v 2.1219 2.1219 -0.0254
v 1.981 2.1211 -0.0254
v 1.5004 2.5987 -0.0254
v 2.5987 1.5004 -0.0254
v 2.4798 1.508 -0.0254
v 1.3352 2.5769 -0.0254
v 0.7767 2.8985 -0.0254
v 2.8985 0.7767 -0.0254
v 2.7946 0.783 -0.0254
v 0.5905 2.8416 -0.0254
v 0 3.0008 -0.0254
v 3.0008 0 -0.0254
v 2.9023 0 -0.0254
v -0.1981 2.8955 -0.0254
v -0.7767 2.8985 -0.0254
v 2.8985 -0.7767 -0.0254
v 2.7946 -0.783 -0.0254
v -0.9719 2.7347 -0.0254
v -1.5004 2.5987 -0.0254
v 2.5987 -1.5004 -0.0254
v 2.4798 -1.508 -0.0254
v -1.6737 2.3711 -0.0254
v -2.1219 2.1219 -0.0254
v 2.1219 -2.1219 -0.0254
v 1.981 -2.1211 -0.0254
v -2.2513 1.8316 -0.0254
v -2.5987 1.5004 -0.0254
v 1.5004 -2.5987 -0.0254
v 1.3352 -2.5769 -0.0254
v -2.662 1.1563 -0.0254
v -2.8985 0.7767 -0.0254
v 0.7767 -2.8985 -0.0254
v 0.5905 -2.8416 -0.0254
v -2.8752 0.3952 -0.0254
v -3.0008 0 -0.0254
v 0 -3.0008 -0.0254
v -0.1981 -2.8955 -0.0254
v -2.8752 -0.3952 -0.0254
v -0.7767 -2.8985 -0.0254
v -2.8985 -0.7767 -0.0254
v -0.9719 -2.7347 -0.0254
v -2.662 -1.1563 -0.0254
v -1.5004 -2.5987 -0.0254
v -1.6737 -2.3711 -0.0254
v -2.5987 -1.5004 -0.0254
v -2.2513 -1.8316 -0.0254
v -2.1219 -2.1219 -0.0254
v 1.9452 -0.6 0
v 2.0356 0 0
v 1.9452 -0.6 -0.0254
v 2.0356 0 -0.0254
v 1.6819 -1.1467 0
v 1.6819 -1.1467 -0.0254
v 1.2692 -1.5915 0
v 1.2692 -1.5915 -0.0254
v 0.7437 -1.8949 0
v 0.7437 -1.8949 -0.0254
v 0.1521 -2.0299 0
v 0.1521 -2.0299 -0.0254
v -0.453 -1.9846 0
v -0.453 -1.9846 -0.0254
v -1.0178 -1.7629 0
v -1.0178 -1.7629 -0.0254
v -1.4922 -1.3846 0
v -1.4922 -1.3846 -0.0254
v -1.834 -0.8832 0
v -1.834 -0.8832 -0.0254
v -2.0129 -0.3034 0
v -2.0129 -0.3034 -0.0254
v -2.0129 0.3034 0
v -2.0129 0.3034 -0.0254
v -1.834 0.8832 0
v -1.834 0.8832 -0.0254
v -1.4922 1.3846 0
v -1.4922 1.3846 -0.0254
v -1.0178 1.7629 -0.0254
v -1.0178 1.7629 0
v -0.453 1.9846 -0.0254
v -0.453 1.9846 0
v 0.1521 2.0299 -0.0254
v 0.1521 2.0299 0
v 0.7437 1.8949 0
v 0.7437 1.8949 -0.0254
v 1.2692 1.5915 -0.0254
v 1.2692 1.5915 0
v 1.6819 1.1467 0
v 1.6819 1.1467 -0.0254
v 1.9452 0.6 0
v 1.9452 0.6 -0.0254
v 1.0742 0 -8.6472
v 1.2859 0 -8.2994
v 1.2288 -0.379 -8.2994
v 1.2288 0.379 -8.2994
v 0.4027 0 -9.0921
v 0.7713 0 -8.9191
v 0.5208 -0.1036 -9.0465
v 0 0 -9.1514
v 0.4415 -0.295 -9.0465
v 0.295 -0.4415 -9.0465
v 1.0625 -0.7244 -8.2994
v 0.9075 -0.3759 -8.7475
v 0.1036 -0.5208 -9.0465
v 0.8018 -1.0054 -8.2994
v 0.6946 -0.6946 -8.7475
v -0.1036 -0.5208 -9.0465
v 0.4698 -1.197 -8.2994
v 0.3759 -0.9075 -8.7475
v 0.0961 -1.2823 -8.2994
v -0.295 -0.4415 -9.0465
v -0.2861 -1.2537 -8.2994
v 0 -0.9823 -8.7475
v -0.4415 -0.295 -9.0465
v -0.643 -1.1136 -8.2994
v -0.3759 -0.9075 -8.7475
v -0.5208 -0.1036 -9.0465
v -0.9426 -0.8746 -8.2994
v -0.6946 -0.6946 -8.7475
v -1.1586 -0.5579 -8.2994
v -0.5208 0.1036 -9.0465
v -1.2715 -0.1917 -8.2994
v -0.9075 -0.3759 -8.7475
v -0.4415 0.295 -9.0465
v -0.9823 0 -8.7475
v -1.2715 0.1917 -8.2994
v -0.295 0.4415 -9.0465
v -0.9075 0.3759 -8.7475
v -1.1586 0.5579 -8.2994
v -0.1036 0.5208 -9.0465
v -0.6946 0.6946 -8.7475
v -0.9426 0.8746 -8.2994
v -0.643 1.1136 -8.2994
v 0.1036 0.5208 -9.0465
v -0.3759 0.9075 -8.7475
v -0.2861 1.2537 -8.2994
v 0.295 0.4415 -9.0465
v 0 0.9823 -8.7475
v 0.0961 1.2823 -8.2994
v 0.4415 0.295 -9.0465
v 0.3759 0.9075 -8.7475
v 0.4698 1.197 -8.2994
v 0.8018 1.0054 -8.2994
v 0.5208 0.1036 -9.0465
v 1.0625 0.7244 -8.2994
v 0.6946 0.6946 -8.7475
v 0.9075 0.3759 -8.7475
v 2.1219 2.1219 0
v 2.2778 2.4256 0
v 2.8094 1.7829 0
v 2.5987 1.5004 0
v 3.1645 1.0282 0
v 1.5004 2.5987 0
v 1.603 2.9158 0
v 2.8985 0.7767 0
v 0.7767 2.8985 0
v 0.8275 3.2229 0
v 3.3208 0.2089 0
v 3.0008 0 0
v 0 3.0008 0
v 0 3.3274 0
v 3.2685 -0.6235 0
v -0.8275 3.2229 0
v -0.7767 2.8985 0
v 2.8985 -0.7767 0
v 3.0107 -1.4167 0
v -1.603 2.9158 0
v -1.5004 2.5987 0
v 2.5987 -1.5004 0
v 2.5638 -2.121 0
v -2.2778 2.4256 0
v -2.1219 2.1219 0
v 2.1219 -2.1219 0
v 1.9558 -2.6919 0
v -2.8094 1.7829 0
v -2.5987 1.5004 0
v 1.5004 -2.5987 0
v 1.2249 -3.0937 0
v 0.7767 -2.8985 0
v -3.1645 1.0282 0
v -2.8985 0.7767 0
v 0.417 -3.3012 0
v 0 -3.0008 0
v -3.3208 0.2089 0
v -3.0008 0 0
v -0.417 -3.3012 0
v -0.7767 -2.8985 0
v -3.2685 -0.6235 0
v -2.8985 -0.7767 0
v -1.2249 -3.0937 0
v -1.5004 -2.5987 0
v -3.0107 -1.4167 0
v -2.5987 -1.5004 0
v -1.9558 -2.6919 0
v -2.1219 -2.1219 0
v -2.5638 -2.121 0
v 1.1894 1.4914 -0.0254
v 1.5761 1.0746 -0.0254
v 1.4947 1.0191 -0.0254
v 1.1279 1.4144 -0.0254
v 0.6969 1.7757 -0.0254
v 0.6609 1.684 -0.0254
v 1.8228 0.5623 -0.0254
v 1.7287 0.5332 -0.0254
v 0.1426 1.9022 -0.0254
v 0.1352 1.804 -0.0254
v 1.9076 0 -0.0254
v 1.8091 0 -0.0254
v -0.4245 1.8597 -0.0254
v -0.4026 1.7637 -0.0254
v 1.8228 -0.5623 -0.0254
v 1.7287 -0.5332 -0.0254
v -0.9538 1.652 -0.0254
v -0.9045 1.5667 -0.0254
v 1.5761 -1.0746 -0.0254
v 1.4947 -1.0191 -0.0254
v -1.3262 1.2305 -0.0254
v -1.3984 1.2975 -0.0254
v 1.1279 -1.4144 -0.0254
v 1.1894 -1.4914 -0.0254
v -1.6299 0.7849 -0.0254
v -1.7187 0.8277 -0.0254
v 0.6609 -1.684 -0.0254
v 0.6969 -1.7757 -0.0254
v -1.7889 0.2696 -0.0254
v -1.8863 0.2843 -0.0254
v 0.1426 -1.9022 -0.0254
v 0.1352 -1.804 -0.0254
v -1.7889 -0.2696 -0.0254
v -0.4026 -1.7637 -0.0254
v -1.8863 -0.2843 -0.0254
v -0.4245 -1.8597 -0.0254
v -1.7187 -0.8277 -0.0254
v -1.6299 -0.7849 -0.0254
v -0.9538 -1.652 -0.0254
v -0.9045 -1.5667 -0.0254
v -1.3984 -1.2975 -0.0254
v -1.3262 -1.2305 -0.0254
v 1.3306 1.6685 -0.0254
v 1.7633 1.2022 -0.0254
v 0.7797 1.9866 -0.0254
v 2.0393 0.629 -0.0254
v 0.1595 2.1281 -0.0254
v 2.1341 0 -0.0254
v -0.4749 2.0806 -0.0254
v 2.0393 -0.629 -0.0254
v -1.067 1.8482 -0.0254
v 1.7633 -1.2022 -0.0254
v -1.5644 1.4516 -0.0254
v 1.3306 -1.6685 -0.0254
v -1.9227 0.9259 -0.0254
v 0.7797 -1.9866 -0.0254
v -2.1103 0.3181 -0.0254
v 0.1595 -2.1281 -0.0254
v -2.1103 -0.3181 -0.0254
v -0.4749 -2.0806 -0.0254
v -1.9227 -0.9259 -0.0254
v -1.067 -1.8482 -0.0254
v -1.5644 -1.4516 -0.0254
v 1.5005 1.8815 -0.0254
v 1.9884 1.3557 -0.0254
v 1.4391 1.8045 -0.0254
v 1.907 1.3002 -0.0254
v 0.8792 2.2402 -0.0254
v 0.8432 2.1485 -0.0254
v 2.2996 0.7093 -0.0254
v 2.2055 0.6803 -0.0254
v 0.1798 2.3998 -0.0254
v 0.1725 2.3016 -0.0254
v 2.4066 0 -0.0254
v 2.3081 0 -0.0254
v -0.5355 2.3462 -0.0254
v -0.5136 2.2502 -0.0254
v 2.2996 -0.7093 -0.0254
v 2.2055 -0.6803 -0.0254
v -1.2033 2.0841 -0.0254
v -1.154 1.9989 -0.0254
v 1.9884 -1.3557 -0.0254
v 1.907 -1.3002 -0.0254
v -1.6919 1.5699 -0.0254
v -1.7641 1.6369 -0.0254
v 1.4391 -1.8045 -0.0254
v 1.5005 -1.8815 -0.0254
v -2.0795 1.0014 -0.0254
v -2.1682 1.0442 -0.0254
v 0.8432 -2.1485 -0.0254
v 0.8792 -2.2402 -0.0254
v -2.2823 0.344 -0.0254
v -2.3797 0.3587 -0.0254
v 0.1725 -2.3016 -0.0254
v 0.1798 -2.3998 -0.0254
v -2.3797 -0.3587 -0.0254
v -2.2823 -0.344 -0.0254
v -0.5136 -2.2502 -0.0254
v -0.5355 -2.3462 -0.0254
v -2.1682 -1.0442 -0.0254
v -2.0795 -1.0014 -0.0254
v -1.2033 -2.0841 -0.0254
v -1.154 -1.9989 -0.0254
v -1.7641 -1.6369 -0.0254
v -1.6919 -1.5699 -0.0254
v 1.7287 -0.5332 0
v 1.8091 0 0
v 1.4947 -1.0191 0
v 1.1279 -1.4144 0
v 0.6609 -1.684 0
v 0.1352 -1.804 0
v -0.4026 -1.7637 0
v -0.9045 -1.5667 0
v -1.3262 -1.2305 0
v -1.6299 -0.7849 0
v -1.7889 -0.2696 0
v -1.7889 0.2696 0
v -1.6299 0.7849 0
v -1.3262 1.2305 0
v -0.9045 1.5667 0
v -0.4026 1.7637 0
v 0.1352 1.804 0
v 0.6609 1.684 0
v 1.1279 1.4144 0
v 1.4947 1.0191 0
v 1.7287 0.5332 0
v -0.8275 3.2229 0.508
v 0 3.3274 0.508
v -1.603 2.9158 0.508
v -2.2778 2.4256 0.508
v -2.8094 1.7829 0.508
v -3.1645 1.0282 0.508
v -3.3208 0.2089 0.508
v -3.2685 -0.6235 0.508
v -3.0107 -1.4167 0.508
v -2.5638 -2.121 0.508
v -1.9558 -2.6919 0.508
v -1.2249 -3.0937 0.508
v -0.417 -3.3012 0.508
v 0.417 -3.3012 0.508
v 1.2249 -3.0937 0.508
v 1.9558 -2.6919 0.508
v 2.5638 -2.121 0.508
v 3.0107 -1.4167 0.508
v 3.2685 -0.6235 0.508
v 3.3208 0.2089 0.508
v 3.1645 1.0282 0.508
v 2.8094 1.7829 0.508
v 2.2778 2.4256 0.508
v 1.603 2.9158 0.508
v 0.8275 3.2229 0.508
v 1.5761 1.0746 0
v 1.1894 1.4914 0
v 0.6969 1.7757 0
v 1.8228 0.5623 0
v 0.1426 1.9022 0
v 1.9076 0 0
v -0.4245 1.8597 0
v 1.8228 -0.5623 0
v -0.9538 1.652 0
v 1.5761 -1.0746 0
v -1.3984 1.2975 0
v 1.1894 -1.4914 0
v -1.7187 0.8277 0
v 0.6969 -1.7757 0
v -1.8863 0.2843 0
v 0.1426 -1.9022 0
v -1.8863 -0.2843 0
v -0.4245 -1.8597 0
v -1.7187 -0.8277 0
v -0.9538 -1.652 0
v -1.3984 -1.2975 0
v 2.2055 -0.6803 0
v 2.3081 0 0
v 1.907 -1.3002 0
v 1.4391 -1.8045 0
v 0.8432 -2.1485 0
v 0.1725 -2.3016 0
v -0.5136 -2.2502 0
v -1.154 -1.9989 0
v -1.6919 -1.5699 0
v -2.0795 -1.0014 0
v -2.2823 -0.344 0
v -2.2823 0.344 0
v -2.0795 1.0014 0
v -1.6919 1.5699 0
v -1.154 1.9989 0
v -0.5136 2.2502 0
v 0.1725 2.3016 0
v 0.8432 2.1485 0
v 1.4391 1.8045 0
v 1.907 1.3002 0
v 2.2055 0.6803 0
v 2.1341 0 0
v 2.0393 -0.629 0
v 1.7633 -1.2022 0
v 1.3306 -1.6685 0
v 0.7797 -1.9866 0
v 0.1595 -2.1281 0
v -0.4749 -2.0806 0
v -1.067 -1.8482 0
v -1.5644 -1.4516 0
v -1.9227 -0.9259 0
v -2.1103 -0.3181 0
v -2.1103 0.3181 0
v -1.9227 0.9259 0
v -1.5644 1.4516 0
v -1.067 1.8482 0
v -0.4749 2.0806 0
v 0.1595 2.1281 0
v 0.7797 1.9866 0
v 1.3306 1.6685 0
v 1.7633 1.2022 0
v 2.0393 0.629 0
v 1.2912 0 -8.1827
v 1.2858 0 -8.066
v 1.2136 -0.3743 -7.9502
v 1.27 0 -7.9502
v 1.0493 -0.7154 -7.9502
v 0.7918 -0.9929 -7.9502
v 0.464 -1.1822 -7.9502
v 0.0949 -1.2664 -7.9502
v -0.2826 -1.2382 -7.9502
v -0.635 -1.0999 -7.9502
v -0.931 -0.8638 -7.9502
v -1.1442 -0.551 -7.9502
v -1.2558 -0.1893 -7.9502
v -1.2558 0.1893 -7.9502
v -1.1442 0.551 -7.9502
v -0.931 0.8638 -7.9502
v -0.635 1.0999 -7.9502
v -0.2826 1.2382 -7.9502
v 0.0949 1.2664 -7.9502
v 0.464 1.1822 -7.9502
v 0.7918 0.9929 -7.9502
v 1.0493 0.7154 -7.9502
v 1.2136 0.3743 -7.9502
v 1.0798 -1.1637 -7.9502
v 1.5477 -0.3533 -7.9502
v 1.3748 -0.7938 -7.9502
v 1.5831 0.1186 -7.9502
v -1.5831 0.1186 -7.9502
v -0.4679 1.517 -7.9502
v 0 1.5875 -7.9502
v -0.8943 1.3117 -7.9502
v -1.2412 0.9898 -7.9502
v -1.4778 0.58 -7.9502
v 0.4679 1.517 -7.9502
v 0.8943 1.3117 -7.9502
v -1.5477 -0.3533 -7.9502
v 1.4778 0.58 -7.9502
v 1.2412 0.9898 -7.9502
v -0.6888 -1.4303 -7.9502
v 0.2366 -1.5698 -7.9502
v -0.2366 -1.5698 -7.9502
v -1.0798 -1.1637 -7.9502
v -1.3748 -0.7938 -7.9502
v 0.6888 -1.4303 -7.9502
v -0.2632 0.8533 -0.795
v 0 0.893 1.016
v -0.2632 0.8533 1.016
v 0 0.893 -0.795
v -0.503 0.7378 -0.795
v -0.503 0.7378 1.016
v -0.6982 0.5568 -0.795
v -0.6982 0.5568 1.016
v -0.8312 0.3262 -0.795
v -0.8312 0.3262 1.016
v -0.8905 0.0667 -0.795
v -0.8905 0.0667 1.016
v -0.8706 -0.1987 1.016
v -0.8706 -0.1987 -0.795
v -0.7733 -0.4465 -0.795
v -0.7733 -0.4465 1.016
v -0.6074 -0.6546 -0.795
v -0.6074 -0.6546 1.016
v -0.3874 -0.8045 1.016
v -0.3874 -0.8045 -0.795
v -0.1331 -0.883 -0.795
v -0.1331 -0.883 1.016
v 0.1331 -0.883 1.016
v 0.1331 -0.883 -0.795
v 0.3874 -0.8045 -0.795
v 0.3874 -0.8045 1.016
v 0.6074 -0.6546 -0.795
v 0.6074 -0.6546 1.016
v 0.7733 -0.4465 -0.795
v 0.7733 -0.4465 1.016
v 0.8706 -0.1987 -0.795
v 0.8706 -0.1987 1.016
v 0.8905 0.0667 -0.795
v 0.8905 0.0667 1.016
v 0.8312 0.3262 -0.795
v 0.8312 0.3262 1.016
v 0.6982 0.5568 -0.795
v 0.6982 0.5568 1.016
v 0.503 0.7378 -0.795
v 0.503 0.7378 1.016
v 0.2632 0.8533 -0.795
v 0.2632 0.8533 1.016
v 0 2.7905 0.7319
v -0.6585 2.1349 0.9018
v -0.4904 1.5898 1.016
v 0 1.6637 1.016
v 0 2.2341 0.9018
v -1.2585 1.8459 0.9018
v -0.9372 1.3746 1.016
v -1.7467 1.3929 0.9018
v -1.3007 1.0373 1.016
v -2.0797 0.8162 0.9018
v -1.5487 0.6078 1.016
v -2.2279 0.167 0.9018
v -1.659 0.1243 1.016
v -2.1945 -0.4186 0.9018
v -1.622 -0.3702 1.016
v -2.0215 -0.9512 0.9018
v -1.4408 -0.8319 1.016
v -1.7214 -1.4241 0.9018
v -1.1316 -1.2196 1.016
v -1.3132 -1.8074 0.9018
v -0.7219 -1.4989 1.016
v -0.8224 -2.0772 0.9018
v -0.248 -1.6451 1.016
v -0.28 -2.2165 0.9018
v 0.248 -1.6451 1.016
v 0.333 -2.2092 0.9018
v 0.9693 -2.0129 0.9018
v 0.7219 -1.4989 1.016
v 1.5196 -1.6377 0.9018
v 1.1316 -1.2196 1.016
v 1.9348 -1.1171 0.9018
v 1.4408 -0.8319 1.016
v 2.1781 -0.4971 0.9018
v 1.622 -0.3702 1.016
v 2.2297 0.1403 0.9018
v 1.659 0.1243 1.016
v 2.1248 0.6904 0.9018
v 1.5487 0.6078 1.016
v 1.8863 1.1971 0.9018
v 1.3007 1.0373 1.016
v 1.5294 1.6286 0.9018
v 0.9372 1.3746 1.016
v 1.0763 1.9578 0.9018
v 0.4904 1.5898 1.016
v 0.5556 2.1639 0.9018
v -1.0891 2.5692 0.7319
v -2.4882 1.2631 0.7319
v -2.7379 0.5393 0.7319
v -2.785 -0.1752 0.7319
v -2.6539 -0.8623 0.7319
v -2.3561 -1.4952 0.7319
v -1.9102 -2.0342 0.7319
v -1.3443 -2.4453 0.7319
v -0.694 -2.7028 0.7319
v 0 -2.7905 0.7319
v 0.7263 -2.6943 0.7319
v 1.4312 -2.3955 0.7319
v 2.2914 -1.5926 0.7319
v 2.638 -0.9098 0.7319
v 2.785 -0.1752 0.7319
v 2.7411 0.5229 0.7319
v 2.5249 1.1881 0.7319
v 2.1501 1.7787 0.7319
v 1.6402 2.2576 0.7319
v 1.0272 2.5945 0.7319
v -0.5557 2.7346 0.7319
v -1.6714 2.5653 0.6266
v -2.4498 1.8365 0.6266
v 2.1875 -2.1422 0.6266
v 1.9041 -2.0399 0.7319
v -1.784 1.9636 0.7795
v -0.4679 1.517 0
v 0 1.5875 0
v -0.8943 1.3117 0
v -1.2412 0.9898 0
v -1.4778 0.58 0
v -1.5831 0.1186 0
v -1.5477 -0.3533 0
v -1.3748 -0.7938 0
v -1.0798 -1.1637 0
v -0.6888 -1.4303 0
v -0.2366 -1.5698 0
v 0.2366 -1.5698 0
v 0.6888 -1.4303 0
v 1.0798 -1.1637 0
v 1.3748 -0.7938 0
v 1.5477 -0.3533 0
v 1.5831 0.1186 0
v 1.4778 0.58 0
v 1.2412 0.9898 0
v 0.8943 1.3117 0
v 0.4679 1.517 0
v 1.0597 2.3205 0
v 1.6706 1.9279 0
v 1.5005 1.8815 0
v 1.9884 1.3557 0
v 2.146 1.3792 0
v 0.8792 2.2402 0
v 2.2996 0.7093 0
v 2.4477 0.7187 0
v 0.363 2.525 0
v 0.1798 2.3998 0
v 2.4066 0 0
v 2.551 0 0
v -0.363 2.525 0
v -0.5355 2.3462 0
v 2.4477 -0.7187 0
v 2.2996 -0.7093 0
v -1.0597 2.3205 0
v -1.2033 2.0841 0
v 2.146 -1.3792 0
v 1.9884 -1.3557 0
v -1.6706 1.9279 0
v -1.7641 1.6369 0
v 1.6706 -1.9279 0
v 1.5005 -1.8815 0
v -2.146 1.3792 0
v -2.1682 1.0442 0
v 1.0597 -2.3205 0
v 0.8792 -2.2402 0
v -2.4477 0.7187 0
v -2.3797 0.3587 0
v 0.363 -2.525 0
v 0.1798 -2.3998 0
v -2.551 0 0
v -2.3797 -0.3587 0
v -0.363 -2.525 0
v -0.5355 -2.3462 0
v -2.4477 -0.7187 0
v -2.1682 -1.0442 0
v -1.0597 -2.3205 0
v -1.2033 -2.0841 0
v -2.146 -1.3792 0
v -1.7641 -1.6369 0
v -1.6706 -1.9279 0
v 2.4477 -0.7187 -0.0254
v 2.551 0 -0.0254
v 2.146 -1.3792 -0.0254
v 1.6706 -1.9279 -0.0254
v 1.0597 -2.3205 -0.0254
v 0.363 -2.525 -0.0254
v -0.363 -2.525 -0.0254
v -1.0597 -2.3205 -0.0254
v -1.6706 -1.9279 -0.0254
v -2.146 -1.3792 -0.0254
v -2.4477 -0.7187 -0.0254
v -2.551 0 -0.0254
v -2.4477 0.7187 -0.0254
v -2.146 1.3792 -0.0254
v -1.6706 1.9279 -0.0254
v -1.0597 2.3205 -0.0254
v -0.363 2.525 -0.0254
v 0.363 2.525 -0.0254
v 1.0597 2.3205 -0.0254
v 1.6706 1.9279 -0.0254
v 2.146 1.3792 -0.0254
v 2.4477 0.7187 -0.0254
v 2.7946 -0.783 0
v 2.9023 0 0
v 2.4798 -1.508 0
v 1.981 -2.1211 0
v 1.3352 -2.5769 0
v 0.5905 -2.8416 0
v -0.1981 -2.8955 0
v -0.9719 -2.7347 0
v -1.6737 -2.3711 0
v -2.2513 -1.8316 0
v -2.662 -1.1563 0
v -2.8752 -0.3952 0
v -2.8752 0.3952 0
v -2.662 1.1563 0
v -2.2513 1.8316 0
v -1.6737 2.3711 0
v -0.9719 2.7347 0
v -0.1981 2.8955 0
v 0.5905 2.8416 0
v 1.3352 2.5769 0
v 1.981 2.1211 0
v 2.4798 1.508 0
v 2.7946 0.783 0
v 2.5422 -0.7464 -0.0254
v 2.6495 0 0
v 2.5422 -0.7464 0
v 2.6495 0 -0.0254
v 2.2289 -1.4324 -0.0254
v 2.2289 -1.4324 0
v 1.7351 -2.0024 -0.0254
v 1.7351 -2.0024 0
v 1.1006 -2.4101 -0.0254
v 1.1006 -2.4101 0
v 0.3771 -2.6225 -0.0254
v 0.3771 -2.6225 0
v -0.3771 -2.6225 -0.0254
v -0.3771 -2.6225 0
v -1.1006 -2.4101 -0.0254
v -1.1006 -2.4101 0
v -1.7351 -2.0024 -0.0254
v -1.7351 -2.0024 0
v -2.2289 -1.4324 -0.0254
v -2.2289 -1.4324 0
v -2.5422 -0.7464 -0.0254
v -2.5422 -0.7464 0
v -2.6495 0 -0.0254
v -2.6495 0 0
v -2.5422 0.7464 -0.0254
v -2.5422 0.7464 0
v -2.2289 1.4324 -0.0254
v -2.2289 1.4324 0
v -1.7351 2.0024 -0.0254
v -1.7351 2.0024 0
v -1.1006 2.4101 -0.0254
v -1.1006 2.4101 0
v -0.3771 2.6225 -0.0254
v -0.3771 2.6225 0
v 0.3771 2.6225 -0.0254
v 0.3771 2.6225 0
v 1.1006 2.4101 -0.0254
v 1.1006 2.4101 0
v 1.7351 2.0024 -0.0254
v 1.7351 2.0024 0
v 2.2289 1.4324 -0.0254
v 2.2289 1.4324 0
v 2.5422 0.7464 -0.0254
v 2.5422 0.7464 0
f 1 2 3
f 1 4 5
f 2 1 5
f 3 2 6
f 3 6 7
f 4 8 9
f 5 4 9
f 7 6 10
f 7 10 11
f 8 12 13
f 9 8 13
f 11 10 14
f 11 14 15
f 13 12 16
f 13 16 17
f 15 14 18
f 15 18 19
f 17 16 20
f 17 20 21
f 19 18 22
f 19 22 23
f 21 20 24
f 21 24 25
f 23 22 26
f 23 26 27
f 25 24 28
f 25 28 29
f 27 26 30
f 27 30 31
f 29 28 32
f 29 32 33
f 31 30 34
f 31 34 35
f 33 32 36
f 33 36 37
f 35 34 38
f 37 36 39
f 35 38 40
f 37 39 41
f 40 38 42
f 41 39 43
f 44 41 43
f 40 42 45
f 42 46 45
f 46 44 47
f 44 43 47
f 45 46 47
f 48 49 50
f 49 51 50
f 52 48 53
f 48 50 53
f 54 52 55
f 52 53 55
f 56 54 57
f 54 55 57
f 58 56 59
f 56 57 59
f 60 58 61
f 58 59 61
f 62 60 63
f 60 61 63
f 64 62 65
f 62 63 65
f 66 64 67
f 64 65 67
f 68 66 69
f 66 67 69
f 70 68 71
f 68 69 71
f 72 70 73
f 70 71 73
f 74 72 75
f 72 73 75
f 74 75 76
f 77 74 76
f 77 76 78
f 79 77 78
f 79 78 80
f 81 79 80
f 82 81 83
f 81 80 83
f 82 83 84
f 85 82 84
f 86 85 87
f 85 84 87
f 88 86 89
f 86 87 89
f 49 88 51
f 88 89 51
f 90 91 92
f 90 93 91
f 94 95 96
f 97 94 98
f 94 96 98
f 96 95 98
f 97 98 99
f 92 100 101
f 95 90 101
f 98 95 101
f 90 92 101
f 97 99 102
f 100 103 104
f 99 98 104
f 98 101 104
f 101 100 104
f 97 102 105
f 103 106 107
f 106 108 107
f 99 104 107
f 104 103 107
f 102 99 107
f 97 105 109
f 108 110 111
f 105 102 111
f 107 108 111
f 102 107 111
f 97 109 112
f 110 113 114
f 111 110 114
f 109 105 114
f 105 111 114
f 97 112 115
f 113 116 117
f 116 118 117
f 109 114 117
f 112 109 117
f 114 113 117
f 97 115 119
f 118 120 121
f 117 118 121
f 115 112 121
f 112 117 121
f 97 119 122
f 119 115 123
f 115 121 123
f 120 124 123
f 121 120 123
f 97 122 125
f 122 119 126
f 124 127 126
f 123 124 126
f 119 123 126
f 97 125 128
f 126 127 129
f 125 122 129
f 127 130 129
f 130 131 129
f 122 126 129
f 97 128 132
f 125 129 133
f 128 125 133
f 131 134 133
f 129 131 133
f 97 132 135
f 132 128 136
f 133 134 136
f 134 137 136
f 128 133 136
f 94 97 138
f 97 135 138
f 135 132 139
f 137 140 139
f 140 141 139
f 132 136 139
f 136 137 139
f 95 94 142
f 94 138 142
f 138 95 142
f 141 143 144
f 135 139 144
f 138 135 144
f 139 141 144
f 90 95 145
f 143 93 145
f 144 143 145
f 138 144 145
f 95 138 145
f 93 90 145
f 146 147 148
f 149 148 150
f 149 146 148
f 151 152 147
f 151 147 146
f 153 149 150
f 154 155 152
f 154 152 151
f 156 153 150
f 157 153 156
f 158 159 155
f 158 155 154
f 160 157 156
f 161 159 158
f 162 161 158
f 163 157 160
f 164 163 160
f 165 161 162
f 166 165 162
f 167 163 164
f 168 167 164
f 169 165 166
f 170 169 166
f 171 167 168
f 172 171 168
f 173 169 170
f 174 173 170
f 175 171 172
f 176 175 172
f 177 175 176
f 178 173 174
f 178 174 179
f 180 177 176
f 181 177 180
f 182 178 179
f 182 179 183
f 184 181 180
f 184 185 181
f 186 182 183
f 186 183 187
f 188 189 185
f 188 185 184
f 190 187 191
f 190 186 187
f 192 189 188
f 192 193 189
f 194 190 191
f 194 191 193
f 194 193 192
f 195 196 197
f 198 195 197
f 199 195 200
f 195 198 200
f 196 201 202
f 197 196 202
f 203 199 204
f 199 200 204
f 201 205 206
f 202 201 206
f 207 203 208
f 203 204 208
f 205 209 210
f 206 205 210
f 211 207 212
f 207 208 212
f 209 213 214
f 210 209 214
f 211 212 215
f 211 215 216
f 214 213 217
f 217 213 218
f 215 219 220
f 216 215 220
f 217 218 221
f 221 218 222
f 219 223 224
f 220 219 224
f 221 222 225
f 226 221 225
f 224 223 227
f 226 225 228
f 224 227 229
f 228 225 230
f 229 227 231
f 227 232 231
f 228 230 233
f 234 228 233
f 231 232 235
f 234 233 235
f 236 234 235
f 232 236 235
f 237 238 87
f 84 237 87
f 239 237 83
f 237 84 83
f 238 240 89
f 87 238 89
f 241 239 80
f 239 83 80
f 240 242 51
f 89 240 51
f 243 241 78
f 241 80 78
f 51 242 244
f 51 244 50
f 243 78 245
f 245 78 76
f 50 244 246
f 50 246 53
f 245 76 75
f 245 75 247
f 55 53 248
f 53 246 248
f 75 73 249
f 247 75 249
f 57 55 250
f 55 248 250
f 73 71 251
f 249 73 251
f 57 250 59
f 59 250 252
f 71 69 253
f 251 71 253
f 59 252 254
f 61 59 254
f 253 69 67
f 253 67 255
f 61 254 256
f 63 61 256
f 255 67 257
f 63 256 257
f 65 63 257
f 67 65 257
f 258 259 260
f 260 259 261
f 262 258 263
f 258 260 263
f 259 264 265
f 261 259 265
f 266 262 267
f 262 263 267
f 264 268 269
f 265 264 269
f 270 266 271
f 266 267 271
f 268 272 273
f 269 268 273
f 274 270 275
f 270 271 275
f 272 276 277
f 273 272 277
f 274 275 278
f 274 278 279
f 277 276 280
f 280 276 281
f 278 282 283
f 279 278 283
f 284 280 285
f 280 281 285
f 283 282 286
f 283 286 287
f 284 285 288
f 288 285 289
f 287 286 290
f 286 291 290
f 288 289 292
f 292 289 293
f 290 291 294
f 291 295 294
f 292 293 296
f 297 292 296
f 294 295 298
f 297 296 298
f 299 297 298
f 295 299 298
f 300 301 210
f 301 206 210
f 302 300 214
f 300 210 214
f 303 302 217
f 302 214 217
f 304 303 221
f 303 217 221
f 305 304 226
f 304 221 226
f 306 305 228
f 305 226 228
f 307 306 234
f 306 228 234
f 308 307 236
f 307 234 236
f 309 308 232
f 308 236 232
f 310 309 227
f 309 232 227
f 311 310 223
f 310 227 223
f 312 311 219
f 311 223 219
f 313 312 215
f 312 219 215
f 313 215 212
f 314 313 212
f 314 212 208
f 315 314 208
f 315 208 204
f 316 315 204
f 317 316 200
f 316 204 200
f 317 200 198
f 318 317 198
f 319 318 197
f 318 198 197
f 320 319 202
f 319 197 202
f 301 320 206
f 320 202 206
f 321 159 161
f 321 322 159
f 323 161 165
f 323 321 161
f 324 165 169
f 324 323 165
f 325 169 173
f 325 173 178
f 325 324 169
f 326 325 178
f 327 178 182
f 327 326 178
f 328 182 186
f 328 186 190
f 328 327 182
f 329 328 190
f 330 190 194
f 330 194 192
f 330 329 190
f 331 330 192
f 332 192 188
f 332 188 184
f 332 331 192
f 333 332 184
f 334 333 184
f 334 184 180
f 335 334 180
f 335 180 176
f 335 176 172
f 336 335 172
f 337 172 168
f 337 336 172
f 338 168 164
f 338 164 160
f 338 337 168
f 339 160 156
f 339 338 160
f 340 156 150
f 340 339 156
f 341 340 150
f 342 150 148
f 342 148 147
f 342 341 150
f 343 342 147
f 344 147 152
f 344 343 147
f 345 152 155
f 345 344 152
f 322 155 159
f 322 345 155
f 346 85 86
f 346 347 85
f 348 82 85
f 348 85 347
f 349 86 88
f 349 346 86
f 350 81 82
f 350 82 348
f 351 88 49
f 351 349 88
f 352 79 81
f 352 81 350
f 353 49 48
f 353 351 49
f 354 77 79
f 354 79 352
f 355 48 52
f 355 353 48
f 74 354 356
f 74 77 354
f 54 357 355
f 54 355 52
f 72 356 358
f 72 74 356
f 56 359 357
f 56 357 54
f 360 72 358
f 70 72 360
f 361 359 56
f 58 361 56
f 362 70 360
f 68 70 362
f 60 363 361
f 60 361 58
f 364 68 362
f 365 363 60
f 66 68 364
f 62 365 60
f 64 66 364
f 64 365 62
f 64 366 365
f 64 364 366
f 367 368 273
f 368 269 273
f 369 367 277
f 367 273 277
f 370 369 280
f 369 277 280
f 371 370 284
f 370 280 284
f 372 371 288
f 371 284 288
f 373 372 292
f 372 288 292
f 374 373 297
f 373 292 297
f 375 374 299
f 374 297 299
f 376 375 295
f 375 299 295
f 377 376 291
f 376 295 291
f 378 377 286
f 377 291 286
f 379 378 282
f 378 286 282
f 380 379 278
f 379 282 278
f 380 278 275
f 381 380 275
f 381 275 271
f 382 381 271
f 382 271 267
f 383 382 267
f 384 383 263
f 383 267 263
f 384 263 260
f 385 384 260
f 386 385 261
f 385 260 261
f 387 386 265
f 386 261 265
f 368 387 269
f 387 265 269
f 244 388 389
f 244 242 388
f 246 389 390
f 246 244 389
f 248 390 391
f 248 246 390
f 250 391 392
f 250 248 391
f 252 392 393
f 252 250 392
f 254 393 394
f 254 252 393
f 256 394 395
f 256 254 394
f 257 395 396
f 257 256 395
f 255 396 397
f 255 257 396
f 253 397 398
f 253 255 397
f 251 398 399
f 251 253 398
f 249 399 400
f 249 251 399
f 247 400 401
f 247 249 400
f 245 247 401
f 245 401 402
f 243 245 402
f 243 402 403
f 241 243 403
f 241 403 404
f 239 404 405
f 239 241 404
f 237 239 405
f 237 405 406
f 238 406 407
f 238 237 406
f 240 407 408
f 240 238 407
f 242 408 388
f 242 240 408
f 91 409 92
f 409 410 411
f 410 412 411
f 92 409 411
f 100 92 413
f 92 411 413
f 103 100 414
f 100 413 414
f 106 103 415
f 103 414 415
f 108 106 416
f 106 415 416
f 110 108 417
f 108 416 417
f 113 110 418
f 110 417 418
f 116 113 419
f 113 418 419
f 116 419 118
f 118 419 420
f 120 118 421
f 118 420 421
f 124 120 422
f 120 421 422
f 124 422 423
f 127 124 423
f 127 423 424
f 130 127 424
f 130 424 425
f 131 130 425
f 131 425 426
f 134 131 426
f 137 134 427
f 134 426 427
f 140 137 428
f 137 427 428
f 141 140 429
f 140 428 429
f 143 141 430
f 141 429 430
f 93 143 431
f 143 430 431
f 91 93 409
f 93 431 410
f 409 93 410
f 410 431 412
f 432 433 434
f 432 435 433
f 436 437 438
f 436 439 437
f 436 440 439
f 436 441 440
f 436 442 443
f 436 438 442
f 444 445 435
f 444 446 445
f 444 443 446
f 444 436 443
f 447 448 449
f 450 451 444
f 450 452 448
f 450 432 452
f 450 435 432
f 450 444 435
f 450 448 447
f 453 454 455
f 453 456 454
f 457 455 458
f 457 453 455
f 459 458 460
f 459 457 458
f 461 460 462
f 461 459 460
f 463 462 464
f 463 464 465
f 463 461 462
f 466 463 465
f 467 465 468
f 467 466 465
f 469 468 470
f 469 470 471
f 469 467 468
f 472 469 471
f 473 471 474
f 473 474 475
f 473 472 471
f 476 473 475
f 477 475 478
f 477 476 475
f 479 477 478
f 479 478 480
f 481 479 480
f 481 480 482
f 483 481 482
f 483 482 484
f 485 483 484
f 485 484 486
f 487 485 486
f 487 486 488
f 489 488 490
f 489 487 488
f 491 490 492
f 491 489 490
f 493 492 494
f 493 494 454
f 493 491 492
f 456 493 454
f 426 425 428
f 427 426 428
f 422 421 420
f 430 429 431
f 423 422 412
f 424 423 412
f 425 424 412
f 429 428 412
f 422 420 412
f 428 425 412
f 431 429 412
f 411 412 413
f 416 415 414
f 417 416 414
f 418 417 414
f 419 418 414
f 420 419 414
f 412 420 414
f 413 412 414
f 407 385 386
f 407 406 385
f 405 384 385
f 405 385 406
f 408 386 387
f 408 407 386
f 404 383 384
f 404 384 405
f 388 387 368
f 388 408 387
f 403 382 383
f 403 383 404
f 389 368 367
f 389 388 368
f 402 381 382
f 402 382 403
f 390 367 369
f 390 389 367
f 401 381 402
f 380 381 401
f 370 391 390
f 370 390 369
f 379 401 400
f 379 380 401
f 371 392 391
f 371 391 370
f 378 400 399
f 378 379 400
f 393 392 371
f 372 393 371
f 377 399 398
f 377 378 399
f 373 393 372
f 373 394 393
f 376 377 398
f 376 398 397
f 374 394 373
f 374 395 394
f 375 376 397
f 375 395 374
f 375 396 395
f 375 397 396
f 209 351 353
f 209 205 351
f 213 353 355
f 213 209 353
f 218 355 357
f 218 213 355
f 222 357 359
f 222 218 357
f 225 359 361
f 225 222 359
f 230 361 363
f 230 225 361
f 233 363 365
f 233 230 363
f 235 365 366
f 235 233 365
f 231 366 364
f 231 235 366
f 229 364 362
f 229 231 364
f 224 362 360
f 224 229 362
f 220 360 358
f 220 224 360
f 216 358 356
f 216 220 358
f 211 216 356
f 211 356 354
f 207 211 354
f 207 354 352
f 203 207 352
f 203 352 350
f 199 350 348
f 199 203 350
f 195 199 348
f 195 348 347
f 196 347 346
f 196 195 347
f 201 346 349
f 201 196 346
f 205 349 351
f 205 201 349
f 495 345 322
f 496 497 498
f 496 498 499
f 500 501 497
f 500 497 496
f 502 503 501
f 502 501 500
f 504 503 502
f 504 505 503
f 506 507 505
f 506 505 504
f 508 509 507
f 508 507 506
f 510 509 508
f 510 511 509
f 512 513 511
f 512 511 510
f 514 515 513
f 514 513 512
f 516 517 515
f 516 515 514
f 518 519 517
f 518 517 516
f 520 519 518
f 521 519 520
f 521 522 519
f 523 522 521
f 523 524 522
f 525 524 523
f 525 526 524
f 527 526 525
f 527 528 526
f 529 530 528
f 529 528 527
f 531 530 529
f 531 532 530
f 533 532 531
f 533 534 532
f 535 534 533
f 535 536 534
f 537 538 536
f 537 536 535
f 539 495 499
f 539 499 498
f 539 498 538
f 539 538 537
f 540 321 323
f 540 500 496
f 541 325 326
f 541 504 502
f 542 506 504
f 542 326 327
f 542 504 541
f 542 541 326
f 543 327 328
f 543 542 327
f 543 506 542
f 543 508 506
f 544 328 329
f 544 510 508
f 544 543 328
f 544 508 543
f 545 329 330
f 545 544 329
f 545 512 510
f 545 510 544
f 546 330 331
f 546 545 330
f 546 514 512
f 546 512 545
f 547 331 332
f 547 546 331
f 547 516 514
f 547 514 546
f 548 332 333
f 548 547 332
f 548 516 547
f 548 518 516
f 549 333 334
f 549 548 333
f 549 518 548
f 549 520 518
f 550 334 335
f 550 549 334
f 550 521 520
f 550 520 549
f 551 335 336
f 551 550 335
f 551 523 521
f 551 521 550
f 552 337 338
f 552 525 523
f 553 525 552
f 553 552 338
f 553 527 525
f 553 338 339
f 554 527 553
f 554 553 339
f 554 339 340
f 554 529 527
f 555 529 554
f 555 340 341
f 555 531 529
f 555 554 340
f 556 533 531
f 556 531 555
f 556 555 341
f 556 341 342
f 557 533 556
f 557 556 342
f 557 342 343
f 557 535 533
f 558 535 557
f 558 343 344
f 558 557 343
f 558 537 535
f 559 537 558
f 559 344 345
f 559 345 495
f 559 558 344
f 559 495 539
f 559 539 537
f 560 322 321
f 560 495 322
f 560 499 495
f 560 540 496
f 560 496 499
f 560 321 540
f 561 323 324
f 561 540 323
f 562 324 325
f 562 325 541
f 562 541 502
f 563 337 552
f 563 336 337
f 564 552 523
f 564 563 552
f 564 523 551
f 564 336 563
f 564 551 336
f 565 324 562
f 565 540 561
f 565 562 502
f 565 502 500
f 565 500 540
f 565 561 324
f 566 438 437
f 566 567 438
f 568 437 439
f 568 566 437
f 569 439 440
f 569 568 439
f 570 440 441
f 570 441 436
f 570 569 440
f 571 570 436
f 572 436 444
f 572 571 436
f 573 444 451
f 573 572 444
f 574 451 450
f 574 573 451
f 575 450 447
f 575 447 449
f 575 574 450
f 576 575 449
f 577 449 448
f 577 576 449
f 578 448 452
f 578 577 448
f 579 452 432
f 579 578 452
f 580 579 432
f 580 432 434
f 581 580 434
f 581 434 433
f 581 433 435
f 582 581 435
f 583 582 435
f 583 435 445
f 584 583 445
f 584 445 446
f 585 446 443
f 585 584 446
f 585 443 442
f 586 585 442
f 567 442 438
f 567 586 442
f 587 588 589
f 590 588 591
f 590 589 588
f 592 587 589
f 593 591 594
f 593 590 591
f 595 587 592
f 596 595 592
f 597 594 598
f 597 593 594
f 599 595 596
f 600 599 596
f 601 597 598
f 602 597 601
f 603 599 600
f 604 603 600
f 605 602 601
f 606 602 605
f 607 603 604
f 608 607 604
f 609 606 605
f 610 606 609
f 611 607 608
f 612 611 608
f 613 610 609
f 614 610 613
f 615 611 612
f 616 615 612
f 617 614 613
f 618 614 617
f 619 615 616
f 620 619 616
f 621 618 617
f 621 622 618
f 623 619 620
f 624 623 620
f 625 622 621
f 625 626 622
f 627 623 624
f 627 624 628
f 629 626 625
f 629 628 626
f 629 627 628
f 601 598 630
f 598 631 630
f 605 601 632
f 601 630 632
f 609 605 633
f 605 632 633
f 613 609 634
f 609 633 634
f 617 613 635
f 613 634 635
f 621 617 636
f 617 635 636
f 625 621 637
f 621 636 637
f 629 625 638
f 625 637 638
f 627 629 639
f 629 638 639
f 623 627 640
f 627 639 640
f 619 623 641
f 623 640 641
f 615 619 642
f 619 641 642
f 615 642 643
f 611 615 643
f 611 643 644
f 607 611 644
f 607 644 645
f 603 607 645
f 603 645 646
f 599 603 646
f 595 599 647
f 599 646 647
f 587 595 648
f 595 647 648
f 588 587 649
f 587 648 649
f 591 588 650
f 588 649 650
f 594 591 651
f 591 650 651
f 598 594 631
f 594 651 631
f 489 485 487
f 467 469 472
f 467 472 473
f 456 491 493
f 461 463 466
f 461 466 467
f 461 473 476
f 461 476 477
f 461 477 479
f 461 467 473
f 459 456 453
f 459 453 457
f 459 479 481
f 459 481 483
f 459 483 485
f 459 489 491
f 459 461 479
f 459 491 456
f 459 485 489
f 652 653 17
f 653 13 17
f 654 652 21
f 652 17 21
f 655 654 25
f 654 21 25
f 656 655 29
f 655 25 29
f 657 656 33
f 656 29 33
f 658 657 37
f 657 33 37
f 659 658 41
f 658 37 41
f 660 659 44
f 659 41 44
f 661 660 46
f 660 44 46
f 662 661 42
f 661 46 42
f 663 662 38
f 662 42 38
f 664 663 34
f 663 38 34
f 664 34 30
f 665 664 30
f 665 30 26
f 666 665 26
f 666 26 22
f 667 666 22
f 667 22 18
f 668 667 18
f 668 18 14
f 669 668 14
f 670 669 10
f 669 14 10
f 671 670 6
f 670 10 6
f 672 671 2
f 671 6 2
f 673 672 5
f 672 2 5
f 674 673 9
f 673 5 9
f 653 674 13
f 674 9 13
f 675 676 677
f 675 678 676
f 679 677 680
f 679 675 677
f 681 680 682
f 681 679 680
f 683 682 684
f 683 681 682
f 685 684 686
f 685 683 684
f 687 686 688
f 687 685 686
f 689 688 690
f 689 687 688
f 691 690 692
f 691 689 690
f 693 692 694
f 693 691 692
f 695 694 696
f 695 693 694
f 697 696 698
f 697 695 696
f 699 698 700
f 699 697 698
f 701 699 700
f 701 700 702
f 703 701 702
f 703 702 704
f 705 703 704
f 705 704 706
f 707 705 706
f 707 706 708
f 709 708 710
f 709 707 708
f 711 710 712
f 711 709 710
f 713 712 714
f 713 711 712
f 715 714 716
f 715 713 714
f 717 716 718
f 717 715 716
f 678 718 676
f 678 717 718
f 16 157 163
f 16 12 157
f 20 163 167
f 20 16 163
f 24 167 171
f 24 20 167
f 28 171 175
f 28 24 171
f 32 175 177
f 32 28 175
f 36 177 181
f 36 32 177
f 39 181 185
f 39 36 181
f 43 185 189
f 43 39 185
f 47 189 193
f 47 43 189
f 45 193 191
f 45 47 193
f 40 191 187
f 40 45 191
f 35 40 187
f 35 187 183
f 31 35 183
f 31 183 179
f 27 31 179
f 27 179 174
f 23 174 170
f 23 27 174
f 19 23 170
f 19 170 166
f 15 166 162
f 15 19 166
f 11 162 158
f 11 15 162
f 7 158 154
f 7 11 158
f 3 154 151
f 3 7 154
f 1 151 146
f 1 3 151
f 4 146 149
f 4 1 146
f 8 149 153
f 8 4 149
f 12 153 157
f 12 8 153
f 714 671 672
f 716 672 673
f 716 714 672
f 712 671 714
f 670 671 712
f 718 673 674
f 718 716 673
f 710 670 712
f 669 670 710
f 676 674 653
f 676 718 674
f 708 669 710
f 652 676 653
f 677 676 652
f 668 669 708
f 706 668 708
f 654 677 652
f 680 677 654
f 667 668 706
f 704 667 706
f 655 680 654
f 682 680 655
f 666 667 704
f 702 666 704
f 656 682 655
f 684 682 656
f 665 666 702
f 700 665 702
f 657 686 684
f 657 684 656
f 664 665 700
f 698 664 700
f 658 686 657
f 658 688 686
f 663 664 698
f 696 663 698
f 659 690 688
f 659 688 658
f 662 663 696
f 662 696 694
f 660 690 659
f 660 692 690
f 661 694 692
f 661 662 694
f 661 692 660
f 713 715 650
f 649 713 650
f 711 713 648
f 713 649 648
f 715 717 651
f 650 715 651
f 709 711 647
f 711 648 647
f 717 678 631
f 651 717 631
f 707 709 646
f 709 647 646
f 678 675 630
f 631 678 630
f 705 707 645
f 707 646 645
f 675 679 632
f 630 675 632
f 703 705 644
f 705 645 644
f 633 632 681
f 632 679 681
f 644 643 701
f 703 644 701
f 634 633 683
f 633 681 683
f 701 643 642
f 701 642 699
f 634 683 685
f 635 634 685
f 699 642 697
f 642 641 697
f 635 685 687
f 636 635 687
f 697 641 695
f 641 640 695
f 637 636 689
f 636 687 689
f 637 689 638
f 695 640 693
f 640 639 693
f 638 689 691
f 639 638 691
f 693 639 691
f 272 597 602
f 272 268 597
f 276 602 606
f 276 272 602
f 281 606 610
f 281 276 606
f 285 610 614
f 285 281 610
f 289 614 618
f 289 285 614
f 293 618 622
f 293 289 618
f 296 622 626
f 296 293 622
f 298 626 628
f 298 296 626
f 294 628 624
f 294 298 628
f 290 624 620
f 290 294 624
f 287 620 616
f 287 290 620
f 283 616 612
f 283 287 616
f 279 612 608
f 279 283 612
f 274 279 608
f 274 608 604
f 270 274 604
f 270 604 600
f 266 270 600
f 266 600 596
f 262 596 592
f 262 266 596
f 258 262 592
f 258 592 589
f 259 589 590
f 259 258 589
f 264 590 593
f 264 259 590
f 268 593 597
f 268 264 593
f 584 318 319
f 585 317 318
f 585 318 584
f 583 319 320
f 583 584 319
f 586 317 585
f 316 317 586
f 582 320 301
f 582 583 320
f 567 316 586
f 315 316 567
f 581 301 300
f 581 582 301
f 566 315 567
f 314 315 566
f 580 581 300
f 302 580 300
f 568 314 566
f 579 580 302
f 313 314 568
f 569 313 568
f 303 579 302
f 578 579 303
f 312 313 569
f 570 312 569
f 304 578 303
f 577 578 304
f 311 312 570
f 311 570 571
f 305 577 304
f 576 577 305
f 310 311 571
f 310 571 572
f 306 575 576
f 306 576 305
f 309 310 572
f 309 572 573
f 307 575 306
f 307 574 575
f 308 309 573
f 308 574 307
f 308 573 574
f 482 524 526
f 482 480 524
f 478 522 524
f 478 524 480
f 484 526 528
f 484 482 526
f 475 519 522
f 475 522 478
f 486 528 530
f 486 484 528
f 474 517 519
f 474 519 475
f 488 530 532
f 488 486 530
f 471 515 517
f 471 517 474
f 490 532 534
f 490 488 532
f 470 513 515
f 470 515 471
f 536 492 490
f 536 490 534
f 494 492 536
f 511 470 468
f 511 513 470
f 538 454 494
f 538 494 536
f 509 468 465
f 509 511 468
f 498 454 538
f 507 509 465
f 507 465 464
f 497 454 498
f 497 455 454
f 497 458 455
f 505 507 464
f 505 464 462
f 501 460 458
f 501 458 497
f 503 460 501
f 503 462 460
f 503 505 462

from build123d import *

# Parameters (mm, degrees)
CUT_EXTRUDE1_DEPTH      = 14.770273365
CIRPATTERN1_COUNT       = 2
CIRPATTERN1_ANGLE       = 90
SKETCH9_W               = 0.0984853
SKETCH9_H               = 0.0254
SKETCH9_W_2             = 0.098485299
CUT_EXTRUDE2_DEPTH      = 13.82013896
CUT_EXTRUDE2_DEPTH_BACK = 1.81102
SKETCH10_R              = 0.79375


with BuildPart() as part:
    # Sketch2 → Revolve1 (revolve)
    with BuildSketch(Plane(origin=(0, 0, 0), x_dir=(0, 0, -1), z_dir=(1, 0, 0))):
        with BuildLine():
            Line((7.9502, 1.5875), (0, 1.5875))
            Line((0, 1.5875), (0, 3.3274))
            Line((0, 3.3274), (-0.508, 3.3274))
            ThreePointArc((-0.508, 3.3274), (-0.823736431, 2.514400819), (-1.016, 1.6637))
            Line((-1.016, 1.6637), (-1.016, 0.89296875))
            Line((-1.016, 0.89296875), (0, 0.89296875))
            Line((0, 0.89296875), (0.79502, 0.89296875))
            Line((0.79502, 0.89296875), (0.79502, 0))
            Line((0.79502, 0), (7.9502, 0))
            Line((7.9502, 0), (7.9502, 1.5875))
        make_face()
    revolve(axis=Axis((0, 0, -7.9502), (0, 0, 1)))

    # Sketch9 → Revolve4 (revolve)
    with BuildSketch(Plane(origin=(0, 0, 0), x_dir=(1, 0, 0), z_dir=(0, 1, 0))):
        with Locations((2.084848675, 0.0127)):
            Rectangle(SKETCH9_W, SKETCH9_H)
        with Locations((2.357323627, 0.0127)):
            Rectangle(SKETCH9_W, SKETCH9_H)
        with Locations((2.600252293, 0.0127)):
            Rectangle(SKETCH9_W_2, SKETCH9_H)
        with Locations((2.951516006, 0.0127)):
            Rectangle(SKETCH9_W, SKETCH9_H)
        with Locations((1.858332834, 0.0127)):
            Rectangle(SKETCH9_W, SKETCH9_H)
    revolve(axis=Axis((0, 0, 12.9413), (0, 0, -1)))


with BuildPart() as body_2:
    # Sketch7 → Revolve2 (revolve)
    with BuildSketch(Plane(origin=(0, 0, 0), x_dir=(0, 0, -1), z_dir=(1, 0, 0))):
        with BuildLine():
            Line((-12.188329368, 0.79375), (0.79502, 0.79375))
            Line((0.79502, 0.79375), (0.79502, 0))
            Line((0.79502, 0), (-12.9413, 0))
            ThreePointArc((-12.9413, 0), (-12.908763915, 0.146760795), (-12.817252416, 0.266020902))
            Line((-12.817252416, 0.266020902), (-12.188329368, 0.79375))
        make_face()
    revolve(axis=Axis((0, 0, 12.9413), (0, 0, -1)))

    # Sketch3 → Cut-Extrude1 (cut, symmetric)
    with BuildSketch(Plane(origin=(0, 0, 0), x_dir=(1, 0, 0), z_dir=(0, 1, 0))):
        Polygon((-0.99695, -10.809041225), (-0.220871274, -12.9413), (0.220871274, -12.9413), (0.99695, -10.809041225), (0.99695, -13.4493), (-0.99695, -13.4493), align=None)
    cut_extrude1 = extrude(amount=CUT_EXTRUDE1_DEPTH, both=True, mode=Mode.SUBTRACT)

    # CirPattern1: Cut-Extrude1 ×2 about axis
    cirpattern1_axis = Axis((0, 0, 12.9413), (0, 0, -1))
    for i in range(1, CIRPATTERN1_COUNT):
        add(cut_extrude1.rotate(cirpattern1_axis, i * CIRPATTERN1_ANGLE / (CIRPATTERN1_COUNT - 1)), mode=Mode.SUBTRACT)

    # Sketch10 → Cut-Extrude2 (cut, two sides: drawn at the far end of the back side and taken through both)
    with BuildSketch(Plane.XY.offset(1.016).offset(-CUT_EXTRUDE2_DEPTH_BACK)):
        Circle(SKETCH10_R)
    extrude(amount=CUT_EXTRUDE2_DEPTH + CUT_EXTRUDE2_DEPTH_BACK, mode=Mode.SUBTRACT)


with BuildPart() as body_3:
    # Sketch8 → Revolve3 (revolve)
    with BuildSketch(Plane(origin=(0, 0, 0), x_dir=(0, 0, -1), z_dir=(1, 0, 0)), mode=Mode.PRIVATE) as revolve3_sk:
        with BuildLine():
            Line((7.9502, 1.27), (7.9502, 0))
            Line((7.9502, 0), (9.151408333, 0))
            ThreePointArc((9.151408333, 0), (8.919094503, 0.77126382), (8.29945, 1.285907664))
            ThreePointArc((8.29945, 1.285907664), (8.124284091, 1.289829403), (7.9502, 1.27))
        make_face()
    revolve(revolve3_sk.sketch.rotate(Axis((0, 0, -7.9502), (0, 0, -1)), 90), axis=Axis((0, 0, -7.9502), (0, 0, -1)))


solid = Compound([part.part, body_3.part])
